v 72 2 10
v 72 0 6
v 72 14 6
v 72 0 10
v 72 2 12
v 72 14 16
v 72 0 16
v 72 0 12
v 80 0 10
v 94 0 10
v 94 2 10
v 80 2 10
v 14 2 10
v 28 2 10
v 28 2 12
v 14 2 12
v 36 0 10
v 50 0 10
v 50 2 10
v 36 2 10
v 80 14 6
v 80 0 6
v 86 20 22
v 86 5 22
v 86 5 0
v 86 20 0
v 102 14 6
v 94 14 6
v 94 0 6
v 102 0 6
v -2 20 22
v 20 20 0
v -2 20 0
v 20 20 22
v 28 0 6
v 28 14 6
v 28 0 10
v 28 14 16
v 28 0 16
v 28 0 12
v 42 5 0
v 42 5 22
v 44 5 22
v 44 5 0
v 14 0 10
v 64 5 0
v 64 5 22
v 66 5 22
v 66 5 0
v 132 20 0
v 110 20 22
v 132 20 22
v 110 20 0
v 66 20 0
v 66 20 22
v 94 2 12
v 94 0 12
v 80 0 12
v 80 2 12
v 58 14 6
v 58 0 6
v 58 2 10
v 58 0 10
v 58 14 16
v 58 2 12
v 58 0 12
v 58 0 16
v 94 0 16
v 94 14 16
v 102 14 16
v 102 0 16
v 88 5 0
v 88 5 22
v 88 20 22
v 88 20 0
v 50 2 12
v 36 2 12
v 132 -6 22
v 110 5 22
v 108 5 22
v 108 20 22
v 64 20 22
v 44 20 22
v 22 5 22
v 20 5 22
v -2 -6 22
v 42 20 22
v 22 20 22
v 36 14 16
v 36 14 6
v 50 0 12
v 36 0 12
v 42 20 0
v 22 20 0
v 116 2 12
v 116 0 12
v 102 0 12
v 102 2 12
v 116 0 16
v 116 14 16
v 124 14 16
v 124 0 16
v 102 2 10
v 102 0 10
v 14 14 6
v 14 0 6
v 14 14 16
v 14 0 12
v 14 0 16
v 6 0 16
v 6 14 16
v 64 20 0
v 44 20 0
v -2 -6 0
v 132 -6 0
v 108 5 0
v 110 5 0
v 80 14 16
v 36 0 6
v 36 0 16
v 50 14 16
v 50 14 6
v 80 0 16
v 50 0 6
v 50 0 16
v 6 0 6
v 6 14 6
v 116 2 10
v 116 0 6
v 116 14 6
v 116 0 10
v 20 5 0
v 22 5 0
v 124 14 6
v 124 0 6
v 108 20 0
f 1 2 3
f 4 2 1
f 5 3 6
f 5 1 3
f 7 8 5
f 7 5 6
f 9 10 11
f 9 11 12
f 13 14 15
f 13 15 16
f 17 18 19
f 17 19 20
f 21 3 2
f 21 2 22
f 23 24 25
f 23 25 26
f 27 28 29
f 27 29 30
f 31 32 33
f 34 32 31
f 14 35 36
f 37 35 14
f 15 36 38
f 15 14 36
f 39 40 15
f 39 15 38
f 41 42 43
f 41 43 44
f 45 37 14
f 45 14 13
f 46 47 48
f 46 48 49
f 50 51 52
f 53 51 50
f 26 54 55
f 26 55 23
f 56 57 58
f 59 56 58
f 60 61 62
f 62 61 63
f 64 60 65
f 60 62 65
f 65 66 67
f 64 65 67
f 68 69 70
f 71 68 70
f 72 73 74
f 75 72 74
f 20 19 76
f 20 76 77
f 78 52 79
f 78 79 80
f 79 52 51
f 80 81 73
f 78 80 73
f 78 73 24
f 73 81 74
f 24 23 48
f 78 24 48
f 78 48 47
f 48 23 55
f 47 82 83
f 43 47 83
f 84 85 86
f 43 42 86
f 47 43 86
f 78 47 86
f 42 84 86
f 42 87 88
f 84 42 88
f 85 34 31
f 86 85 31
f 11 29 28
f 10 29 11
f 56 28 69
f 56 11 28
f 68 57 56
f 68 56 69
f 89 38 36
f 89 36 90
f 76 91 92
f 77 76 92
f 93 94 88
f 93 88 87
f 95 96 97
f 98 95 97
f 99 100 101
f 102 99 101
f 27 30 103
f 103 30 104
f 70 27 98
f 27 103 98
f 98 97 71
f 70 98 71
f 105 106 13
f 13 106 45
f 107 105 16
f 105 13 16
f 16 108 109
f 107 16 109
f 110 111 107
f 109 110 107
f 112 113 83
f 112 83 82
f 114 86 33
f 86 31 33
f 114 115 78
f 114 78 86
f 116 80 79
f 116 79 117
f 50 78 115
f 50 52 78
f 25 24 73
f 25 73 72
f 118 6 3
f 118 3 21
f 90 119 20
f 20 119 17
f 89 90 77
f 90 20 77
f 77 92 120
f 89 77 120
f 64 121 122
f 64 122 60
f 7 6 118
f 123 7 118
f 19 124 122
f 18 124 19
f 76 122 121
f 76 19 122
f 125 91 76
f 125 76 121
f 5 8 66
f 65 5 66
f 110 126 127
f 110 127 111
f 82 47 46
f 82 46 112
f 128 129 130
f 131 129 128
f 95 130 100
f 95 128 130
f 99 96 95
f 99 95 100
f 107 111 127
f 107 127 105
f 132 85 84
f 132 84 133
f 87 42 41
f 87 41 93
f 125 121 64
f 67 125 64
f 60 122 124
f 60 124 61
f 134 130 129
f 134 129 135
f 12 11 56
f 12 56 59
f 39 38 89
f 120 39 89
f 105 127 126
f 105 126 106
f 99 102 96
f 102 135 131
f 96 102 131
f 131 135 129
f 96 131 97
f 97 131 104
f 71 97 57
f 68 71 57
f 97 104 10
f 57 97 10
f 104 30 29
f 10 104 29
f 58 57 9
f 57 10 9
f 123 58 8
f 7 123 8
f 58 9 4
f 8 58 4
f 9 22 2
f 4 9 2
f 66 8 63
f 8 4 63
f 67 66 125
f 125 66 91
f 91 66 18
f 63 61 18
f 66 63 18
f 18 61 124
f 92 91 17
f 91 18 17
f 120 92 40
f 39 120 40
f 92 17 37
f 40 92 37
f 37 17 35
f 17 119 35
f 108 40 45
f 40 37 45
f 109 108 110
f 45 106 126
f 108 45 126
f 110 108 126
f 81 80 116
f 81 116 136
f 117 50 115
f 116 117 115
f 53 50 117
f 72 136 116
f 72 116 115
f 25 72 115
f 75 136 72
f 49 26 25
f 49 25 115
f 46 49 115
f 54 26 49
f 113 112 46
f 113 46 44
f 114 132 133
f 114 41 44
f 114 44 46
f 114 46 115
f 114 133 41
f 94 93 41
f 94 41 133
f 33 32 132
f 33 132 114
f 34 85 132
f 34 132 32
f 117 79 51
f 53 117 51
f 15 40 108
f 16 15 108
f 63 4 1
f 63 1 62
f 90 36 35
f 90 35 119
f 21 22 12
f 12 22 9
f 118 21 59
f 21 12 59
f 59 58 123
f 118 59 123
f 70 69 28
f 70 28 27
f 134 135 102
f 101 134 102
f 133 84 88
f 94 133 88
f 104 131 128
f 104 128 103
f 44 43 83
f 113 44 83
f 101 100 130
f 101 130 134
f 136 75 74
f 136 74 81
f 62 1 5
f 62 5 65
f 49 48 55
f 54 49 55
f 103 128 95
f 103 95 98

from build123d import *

# Parameters (mm, degrees)
SKETCH1_W           = 20
SKETCH1_H           = 20
BOSS_EXTRUDE1_DEPTH = 22
SKETCH2_W           = 8
SKETCH2_H           = 10
CUT_EXTRUDE1_DEPTH  = 14
SKETCH3_W           = 22
SKETCH3_H           = 5
BOSS_EXTRUDE2_DEPTH = 2
LPATTERN1_COUNT     = 6
LPATTERN1_PITCH     = 22
SKETCH4_W           = 22
SKETCH4_H           = 15
BOSS_EXTRUDE3_DEPTH = 2
SKETCH5_W           = 22
SKETCH5_H           = 20
BOSS_EXTRUDE4_DEPTH = 2
SKETCH6_W           = 118
SKETCH6_H           = 2
CUT_EXTRUDE2_DEPTH  = 2
SKETCH7_W           = 134
SKETCH7_H           = 22
BOSS_EXTRUDE5_DEPTH = 6


with BuildPart() as part:
    # Sketch1 → Boss-Extrude1 (new body)
    with BuildSketch(Plane.XY):
        with Locations((10, 10)):
            Rectangle(SKETCH1_W, SKETCH1_H)
    extrude(amount=BOSS_EXTRUDE1_DEPTH)

    # Sketch2 → Cut-Extrude1 (cut)
    with BuildSketch(Plane.XZ):
        with Locations((10, 11)):
            Rectangle(SKETCH2_W, SKETCH2_H)
    extrude(amount=-CUT_EXTRUDE1_DEPTH, mode=Mode.SUBTRACT)

    # Sketch3 → Boss-Extrude2 (add)
    with BuildSketch(Plane(origin=(20, 0, 0), x_dir=(0, 0, -1), z_dir=(1, 0, 0))):
        with Locations((-11, 2.5)):
            Rectangle(SKETCH3_W, SKETCH3_H)
    extrude(amount=BOSS_EXTRUDE2_DEPTH)


with BuildPart() as lpattern1_1:
    # LPattern1: pattern copy
    add(part.part.moved(Location(Vector(1, 0, 0) * (1 * LPATTERN1_PITCH))))


with BuildPart() as lpattern1_2:
    # LPattern1: pattern copy
    add(part.part.moved(Location(Vector(1, 0, 0) * (2 * LPATTERN1_PITCH))))


with BuildPart() as lpattern1_3:
    # LPattern1: pattern copy
    add(part.part.moved(Location(Vector(1, 0, 0) * (3 * LPATTERN1_PITCH))))


with BuildPart() as lpattern1_4:
    # LPattern1: pattern copy
    add(part.part.moved(Location(Vector(1, 0, 0) * (4 * LPATTERN1_PITCH))))


with BuildPart() as lpattern1_5:
    # LPattern1: pattern copy
    add(part.part.moved(Location(Vector(1, 0, 0) * (5 * LPATTERN1_PITCH))))


with BuildPart() as lpattern1_1_1:
    add(lpattern1_1.part)

    # Combine1: union LPattern1_2, LPattern1_3, LPattern1_4, LPattern1_5, part
    add(lpattern1_2.part)
    add(lpattern1_3.part)
    add(lpattern1_4.part)
    add(lpattern1_5.part)
    add(part.part)

    # Sketch4 → Boss-Extrude3 (add)
    with BuildSketch(Plane(origin=(130, 0, 0), x_dir=(0, 0, -1), z_dir=(1, 0, 0))):
        with Locations((-11, 12.5)):
            Rectangle(SKETCH4_W, SKETCH4_H)
    extrude(amount=BOSS_EXTRUDE3_DEPTH)

    # Sketch5 → Boss-Extrude4 (add)
    with BuildSketch(Plane.ZY):
        with Locations((11, 10)):
            Rectangle(SKETCH5_W, SKETCH5_H)
    extrude(amount=BOSS_EXTRUDE4_DEPTH)

    # Sketch6 → Cut-Extrude2 (cut)
    with BuildSketch(Plane(origin=(0, 0, 0), x_dir=(-1, 0, 0), z_dir=(0, -1, 0))):
        with Locations((-65, -11)):
            Rectangle(SKETCH6_W, SKETCH6_H)
    extrude(amount=-CUT_EXTRUDE2_DEPTH, mode=Mode.SUBTRACT)

    # Sketch7 → Boss-Extrude5 (add)
    with BuildSketch(Plane(origin=(0, 0, 0), x_dir=(-1, 0, 0), z_dir=(0, -1, 0))):
        with Locations((-65, -11)):
            Rectangle(SKETCH7_W, SKETCH7_H)
    extrude(amount=BOSS_EXTRUDE5_DEPTH)


solid = lpattern1_1_1.part
